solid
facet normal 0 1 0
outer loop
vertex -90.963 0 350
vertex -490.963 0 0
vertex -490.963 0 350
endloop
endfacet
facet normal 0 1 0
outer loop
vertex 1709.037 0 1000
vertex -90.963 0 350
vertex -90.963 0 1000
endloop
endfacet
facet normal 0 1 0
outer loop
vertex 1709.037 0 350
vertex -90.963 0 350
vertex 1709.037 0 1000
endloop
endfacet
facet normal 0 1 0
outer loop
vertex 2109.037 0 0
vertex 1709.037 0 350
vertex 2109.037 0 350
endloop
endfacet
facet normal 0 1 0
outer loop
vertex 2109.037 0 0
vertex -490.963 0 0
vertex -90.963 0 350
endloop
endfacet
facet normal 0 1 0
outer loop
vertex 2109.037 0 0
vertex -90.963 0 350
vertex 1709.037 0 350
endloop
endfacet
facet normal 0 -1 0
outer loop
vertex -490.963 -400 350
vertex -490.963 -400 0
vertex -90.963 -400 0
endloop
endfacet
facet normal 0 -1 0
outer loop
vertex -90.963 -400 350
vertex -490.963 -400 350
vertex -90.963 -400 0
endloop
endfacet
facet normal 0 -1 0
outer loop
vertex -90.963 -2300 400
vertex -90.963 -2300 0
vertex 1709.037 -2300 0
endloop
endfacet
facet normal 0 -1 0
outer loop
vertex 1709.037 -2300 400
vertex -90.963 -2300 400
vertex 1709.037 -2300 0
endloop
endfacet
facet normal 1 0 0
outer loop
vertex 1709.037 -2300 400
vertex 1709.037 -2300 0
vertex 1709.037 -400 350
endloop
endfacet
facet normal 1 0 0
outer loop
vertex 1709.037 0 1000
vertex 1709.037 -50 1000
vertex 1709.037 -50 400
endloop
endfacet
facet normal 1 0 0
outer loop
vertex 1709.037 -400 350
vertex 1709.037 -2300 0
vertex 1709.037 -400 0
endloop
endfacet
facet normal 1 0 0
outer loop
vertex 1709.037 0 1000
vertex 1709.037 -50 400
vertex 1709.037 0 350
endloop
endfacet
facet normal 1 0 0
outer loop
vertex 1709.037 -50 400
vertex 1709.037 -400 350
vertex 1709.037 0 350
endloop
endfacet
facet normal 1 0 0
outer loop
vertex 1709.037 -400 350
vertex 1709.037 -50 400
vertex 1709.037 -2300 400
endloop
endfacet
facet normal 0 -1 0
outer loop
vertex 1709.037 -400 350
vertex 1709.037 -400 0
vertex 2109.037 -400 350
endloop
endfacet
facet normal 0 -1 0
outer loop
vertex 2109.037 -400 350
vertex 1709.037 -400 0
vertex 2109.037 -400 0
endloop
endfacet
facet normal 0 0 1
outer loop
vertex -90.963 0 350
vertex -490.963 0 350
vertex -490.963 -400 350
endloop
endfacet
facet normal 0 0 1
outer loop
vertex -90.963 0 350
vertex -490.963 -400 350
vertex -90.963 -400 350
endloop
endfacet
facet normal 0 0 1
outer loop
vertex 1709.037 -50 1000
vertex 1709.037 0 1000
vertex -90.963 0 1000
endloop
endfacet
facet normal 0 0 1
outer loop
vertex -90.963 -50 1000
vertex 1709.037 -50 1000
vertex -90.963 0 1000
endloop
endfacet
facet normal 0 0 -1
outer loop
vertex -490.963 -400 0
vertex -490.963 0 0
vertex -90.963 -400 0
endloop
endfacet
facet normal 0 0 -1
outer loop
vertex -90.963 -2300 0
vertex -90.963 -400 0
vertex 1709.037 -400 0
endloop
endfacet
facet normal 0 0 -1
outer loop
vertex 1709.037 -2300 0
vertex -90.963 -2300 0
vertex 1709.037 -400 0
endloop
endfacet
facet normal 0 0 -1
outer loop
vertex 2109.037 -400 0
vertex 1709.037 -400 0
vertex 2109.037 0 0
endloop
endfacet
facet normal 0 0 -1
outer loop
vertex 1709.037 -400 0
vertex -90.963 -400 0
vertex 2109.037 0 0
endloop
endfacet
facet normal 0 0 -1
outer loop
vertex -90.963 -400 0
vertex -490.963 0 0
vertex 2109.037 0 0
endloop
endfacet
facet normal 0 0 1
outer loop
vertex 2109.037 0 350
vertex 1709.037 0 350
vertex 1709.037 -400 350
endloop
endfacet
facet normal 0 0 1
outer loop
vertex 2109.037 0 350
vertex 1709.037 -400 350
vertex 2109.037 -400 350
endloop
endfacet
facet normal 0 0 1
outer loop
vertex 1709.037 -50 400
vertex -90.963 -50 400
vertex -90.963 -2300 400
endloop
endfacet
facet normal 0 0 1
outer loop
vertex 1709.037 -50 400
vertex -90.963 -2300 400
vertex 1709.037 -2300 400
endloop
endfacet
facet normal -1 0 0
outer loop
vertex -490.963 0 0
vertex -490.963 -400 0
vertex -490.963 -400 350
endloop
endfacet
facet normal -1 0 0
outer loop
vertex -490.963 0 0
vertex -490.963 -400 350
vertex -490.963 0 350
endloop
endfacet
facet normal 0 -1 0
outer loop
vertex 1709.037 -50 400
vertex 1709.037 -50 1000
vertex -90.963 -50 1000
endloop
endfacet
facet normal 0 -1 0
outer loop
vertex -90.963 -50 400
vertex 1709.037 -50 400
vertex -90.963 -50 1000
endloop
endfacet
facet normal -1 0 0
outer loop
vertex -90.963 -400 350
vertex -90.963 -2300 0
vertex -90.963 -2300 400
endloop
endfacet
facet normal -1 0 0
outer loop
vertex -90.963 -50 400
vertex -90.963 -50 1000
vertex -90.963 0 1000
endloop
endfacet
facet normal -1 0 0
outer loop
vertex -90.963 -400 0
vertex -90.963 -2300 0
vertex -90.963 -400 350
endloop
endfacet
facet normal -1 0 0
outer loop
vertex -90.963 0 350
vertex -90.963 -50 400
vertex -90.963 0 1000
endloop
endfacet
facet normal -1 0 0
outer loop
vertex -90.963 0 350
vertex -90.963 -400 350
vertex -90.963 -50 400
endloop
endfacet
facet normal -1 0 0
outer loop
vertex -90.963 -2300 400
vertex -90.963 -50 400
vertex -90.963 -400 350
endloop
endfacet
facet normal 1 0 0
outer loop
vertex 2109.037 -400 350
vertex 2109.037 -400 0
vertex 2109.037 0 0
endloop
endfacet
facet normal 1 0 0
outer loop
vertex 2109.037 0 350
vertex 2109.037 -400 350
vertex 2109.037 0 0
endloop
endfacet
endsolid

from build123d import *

# Parameters (mm, degrees)
F0_W     = 1800
F0_H     = 2300
F1_DEPTH = 400
F2_W     = 400
F2_H     = 400
F3_DEPTH = 350
F4_W     = 1800
F4_H     = 1000
F5_DEPTH = 50


with BuildPart() as f1:
    # F0 (on Top) → F1 (new body)
    with BuildSketch(Plane.XY):
        with Locations((809.037431, -1150)):
            Rectangle(F0_W, F0_H)
    extrude(amount=F1_DEPTH)

    # F2 (on Top) → F3 (join)
    with BuildSketch(Plane.XY):
        with Locations((1909.037431, -200)):
            Rectangle(F2_W, F2_H)
        with Locations((-290.962569, -200)):
            Rectangle(F2_W, F2_H)
    extrude(amount=F3_DEPTH)

    # F4 (on face) → F5 (join)
    with BuildSketch(Plane(origin=(0, 0, 0), x_dir=(-1, 0, 0), z_dir=(0, 1, 0))):
        with Locations((-809.037431, 500)):
            Rectangle(F4_W, F4_H)
    extrude(amount=-F5_DEPTH)


solid = f1.part
